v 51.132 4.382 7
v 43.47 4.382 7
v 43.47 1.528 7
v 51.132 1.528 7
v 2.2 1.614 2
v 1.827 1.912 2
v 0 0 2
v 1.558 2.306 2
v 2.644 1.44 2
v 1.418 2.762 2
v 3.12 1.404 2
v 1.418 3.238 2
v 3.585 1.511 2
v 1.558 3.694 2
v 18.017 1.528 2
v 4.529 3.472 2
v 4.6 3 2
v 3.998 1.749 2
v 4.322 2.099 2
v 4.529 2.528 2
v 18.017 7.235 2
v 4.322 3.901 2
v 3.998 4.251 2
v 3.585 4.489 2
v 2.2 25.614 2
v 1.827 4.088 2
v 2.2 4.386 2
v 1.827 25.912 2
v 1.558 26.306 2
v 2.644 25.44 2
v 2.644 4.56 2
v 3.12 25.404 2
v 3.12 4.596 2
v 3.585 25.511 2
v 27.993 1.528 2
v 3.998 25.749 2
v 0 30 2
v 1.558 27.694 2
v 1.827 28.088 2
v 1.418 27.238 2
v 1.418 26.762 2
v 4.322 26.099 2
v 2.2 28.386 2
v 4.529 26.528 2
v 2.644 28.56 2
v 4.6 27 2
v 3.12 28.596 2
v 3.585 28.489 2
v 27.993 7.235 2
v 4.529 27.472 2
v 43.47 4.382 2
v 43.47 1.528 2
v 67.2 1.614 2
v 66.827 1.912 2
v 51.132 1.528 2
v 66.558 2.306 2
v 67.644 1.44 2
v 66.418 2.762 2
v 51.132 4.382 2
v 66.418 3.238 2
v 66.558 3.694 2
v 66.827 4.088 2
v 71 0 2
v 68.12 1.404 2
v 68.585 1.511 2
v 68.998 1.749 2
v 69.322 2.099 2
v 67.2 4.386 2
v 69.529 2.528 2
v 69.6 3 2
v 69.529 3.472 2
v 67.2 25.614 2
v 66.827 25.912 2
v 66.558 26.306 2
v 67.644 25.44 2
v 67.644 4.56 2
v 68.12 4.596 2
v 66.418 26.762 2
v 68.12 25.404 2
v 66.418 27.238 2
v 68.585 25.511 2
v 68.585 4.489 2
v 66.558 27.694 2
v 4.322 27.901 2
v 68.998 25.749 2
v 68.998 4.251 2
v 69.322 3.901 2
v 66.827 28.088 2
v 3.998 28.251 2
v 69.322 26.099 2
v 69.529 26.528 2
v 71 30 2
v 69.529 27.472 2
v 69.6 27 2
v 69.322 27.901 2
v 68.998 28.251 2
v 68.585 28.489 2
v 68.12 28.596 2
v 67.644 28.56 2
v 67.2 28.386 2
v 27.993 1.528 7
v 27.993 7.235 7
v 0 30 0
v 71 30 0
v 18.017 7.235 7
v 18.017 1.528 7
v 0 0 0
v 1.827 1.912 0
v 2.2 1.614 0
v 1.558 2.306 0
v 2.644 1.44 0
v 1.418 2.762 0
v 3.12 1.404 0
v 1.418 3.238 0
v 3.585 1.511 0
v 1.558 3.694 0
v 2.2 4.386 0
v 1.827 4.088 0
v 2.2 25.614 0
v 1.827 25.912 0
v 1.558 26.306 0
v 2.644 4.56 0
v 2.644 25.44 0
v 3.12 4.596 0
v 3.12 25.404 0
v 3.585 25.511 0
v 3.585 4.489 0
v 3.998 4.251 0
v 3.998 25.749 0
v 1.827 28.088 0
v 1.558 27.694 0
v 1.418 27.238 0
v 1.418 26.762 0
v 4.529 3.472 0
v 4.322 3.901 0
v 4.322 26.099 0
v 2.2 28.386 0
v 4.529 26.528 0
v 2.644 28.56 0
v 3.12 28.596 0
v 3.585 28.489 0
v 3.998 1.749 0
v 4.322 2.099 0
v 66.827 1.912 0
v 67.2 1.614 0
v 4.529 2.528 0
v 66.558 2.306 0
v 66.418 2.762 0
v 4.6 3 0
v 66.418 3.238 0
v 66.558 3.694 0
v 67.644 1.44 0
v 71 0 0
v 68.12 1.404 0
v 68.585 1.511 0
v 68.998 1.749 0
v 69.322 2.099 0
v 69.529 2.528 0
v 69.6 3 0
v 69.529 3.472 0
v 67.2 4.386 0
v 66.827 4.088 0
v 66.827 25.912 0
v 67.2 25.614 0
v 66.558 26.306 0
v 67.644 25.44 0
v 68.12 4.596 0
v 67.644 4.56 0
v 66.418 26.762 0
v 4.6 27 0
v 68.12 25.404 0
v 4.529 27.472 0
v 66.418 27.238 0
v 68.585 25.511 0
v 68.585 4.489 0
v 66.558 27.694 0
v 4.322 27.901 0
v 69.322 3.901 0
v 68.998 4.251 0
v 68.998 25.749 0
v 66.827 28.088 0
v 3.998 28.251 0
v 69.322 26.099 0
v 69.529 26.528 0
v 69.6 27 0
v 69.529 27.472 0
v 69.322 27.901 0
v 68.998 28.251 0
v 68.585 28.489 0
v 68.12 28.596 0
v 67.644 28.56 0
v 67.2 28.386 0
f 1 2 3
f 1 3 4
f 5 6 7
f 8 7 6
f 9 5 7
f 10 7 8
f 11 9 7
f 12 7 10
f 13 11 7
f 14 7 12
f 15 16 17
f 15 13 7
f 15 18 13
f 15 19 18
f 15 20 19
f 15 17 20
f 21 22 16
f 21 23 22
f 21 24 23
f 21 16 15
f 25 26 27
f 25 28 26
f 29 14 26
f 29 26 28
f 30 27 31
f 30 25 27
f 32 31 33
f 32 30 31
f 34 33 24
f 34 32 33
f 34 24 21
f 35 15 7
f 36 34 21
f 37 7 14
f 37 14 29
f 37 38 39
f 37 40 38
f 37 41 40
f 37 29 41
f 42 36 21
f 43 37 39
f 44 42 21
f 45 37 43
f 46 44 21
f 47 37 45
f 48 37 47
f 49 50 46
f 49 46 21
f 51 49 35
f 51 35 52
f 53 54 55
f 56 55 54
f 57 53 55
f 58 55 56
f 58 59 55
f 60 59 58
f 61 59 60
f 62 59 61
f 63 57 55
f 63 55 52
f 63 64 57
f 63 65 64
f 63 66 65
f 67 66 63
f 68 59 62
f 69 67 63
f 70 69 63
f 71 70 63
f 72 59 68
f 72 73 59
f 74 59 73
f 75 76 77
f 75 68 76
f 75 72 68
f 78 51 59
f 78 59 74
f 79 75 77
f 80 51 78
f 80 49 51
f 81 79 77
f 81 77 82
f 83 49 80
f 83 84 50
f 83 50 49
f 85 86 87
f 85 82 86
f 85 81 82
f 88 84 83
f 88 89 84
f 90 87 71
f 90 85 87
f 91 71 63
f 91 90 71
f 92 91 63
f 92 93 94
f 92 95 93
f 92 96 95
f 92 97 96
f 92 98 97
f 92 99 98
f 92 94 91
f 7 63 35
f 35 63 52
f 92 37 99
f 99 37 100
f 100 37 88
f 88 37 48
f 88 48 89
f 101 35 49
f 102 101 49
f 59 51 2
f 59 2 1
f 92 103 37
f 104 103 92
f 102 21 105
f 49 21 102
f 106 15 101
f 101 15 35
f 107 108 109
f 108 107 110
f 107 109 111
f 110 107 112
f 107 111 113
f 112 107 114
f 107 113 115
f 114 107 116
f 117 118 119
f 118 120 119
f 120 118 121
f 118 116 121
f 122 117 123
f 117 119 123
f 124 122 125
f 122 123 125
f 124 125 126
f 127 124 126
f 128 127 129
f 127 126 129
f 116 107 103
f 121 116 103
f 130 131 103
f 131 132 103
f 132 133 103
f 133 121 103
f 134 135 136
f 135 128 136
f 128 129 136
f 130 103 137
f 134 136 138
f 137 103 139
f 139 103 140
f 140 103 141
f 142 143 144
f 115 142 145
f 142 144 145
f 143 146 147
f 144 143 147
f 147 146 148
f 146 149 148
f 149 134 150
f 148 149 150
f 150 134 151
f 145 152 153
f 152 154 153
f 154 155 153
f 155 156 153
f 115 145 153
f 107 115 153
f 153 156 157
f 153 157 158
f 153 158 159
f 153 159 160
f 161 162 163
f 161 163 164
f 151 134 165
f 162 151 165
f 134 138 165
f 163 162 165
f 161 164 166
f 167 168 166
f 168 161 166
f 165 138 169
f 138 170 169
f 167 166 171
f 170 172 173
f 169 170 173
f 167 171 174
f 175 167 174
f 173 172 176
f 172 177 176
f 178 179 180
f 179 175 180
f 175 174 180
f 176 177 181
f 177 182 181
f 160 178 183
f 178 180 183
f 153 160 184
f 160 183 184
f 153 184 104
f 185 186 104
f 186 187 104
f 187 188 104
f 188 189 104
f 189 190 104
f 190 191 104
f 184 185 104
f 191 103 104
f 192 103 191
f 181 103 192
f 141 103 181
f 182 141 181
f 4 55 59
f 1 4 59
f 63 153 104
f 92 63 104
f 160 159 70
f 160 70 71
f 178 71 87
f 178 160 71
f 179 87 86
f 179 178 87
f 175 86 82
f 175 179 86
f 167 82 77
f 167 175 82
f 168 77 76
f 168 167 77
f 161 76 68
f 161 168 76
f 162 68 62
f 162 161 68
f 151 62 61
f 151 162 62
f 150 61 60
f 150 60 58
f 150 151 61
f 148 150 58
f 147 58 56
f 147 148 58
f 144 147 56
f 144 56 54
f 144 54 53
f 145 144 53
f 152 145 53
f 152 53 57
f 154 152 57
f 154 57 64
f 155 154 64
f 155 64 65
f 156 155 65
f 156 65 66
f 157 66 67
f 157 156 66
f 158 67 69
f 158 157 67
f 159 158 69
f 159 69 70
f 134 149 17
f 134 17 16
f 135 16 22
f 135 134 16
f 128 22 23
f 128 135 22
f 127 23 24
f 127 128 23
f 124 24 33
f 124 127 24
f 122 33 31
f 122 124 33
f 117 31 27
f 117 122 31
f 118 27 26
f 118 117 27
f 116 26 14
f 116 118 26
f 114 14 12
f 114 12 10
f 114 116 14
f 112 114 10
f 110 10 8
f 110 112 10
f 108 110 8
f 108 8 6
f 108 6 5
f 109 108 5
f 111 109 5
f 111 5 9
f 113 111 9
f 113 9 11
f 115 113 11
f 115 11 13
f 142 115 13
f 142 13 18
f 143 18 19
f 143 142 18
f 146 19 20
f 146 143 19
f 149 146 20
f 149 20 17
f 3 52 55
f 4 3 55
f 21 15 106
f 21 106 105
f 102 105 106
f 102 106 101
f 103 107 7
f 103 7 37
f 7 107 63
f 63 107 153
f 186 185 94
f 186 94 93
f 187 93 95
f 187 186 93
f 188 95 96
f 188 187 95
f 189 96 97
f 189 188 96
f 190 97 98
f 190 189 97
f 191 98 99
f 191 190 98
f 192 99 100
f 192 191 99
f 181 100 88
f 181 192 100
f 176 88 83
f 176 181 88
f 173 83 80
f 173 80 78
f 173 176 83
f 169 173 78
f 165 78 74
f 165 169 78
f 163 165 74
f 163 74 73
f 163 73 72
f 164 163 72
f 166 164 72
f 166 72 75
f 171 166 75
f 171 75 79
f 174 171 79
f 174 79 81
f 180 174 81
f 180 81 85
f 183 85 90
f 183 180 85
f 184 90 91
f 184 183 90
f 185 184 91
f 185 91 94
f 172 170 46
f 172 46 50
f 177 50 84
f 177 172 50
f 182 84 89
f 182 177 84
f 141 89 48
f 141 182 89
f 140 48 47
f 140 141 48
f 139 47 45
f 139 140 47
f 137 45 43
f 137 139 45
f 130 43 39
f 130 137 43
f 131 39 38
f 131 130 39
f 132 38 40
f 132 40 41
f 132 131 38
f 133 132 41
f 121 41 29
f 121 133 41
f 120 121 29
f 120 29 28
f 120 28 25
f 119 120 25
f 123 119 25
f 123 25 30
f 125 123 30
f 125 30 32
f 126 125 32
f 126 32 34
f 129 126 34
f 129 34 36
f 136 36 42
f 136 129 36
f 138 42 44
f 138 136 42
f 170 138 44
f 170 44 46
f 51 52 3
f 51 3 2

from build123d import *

# Parameters (mm, degrees)
SKETCH_1_W      = 71
SKETCH_1_H      = 30
SKETCH_1_R      = 1.6
EXTRUDE_1_DEPTH = 2
SKETCH_2_W      = 9.975674075
SKETCH_2_H      = 5.707731043
SKETCH_2_W_2    = 7.661729058
SKETCH_2_H_2    = 2.853865522
EXTRUDE_2_DEPTH = 5


with BuildPart() as part:
    # 草图1 → 凸台-拉伸1 (new body)
    with BuildSketch(Plane.XY):
        with Locations((35.5, 15)):
            Rectangle(SKETCH_1_W, SKETCH_1_H)
        with Locations((3, 27)):
            Circle(SKETCH_1_R, mode=Mode.SUBTRACT)
        with Locations((68, 3)):
            Circle(SKETCH_1_R, mode=Mode.SUBTRACT)
        with Locations((3, 3)):
            Circle(SKETCH_1_R, mode=Mode.SUBTRACT)
        with Locations((68, 27)):
            Circle(SKETCH_1_R, mode=Mode.SUBTRACT)
    extrude(amount=EXTRUDE_1_DEPTH)

    # 草图2 → 凸台-拉伸2 (add)
    with BuildSketch(Plane.XY.offset(2)):
        with Locations((23.004696906, 4.381563419)):
            Rectangle(SKETCH_2_W, SKETCH_2_H)
        with Locations((47.301119589, 2.954630659)):
            Rectangle(SKETCH_2_W_2, SKETCH_2_H_2)
    extrude(amount=EXTRUDE_2_DEPTH)


solid = part.part
